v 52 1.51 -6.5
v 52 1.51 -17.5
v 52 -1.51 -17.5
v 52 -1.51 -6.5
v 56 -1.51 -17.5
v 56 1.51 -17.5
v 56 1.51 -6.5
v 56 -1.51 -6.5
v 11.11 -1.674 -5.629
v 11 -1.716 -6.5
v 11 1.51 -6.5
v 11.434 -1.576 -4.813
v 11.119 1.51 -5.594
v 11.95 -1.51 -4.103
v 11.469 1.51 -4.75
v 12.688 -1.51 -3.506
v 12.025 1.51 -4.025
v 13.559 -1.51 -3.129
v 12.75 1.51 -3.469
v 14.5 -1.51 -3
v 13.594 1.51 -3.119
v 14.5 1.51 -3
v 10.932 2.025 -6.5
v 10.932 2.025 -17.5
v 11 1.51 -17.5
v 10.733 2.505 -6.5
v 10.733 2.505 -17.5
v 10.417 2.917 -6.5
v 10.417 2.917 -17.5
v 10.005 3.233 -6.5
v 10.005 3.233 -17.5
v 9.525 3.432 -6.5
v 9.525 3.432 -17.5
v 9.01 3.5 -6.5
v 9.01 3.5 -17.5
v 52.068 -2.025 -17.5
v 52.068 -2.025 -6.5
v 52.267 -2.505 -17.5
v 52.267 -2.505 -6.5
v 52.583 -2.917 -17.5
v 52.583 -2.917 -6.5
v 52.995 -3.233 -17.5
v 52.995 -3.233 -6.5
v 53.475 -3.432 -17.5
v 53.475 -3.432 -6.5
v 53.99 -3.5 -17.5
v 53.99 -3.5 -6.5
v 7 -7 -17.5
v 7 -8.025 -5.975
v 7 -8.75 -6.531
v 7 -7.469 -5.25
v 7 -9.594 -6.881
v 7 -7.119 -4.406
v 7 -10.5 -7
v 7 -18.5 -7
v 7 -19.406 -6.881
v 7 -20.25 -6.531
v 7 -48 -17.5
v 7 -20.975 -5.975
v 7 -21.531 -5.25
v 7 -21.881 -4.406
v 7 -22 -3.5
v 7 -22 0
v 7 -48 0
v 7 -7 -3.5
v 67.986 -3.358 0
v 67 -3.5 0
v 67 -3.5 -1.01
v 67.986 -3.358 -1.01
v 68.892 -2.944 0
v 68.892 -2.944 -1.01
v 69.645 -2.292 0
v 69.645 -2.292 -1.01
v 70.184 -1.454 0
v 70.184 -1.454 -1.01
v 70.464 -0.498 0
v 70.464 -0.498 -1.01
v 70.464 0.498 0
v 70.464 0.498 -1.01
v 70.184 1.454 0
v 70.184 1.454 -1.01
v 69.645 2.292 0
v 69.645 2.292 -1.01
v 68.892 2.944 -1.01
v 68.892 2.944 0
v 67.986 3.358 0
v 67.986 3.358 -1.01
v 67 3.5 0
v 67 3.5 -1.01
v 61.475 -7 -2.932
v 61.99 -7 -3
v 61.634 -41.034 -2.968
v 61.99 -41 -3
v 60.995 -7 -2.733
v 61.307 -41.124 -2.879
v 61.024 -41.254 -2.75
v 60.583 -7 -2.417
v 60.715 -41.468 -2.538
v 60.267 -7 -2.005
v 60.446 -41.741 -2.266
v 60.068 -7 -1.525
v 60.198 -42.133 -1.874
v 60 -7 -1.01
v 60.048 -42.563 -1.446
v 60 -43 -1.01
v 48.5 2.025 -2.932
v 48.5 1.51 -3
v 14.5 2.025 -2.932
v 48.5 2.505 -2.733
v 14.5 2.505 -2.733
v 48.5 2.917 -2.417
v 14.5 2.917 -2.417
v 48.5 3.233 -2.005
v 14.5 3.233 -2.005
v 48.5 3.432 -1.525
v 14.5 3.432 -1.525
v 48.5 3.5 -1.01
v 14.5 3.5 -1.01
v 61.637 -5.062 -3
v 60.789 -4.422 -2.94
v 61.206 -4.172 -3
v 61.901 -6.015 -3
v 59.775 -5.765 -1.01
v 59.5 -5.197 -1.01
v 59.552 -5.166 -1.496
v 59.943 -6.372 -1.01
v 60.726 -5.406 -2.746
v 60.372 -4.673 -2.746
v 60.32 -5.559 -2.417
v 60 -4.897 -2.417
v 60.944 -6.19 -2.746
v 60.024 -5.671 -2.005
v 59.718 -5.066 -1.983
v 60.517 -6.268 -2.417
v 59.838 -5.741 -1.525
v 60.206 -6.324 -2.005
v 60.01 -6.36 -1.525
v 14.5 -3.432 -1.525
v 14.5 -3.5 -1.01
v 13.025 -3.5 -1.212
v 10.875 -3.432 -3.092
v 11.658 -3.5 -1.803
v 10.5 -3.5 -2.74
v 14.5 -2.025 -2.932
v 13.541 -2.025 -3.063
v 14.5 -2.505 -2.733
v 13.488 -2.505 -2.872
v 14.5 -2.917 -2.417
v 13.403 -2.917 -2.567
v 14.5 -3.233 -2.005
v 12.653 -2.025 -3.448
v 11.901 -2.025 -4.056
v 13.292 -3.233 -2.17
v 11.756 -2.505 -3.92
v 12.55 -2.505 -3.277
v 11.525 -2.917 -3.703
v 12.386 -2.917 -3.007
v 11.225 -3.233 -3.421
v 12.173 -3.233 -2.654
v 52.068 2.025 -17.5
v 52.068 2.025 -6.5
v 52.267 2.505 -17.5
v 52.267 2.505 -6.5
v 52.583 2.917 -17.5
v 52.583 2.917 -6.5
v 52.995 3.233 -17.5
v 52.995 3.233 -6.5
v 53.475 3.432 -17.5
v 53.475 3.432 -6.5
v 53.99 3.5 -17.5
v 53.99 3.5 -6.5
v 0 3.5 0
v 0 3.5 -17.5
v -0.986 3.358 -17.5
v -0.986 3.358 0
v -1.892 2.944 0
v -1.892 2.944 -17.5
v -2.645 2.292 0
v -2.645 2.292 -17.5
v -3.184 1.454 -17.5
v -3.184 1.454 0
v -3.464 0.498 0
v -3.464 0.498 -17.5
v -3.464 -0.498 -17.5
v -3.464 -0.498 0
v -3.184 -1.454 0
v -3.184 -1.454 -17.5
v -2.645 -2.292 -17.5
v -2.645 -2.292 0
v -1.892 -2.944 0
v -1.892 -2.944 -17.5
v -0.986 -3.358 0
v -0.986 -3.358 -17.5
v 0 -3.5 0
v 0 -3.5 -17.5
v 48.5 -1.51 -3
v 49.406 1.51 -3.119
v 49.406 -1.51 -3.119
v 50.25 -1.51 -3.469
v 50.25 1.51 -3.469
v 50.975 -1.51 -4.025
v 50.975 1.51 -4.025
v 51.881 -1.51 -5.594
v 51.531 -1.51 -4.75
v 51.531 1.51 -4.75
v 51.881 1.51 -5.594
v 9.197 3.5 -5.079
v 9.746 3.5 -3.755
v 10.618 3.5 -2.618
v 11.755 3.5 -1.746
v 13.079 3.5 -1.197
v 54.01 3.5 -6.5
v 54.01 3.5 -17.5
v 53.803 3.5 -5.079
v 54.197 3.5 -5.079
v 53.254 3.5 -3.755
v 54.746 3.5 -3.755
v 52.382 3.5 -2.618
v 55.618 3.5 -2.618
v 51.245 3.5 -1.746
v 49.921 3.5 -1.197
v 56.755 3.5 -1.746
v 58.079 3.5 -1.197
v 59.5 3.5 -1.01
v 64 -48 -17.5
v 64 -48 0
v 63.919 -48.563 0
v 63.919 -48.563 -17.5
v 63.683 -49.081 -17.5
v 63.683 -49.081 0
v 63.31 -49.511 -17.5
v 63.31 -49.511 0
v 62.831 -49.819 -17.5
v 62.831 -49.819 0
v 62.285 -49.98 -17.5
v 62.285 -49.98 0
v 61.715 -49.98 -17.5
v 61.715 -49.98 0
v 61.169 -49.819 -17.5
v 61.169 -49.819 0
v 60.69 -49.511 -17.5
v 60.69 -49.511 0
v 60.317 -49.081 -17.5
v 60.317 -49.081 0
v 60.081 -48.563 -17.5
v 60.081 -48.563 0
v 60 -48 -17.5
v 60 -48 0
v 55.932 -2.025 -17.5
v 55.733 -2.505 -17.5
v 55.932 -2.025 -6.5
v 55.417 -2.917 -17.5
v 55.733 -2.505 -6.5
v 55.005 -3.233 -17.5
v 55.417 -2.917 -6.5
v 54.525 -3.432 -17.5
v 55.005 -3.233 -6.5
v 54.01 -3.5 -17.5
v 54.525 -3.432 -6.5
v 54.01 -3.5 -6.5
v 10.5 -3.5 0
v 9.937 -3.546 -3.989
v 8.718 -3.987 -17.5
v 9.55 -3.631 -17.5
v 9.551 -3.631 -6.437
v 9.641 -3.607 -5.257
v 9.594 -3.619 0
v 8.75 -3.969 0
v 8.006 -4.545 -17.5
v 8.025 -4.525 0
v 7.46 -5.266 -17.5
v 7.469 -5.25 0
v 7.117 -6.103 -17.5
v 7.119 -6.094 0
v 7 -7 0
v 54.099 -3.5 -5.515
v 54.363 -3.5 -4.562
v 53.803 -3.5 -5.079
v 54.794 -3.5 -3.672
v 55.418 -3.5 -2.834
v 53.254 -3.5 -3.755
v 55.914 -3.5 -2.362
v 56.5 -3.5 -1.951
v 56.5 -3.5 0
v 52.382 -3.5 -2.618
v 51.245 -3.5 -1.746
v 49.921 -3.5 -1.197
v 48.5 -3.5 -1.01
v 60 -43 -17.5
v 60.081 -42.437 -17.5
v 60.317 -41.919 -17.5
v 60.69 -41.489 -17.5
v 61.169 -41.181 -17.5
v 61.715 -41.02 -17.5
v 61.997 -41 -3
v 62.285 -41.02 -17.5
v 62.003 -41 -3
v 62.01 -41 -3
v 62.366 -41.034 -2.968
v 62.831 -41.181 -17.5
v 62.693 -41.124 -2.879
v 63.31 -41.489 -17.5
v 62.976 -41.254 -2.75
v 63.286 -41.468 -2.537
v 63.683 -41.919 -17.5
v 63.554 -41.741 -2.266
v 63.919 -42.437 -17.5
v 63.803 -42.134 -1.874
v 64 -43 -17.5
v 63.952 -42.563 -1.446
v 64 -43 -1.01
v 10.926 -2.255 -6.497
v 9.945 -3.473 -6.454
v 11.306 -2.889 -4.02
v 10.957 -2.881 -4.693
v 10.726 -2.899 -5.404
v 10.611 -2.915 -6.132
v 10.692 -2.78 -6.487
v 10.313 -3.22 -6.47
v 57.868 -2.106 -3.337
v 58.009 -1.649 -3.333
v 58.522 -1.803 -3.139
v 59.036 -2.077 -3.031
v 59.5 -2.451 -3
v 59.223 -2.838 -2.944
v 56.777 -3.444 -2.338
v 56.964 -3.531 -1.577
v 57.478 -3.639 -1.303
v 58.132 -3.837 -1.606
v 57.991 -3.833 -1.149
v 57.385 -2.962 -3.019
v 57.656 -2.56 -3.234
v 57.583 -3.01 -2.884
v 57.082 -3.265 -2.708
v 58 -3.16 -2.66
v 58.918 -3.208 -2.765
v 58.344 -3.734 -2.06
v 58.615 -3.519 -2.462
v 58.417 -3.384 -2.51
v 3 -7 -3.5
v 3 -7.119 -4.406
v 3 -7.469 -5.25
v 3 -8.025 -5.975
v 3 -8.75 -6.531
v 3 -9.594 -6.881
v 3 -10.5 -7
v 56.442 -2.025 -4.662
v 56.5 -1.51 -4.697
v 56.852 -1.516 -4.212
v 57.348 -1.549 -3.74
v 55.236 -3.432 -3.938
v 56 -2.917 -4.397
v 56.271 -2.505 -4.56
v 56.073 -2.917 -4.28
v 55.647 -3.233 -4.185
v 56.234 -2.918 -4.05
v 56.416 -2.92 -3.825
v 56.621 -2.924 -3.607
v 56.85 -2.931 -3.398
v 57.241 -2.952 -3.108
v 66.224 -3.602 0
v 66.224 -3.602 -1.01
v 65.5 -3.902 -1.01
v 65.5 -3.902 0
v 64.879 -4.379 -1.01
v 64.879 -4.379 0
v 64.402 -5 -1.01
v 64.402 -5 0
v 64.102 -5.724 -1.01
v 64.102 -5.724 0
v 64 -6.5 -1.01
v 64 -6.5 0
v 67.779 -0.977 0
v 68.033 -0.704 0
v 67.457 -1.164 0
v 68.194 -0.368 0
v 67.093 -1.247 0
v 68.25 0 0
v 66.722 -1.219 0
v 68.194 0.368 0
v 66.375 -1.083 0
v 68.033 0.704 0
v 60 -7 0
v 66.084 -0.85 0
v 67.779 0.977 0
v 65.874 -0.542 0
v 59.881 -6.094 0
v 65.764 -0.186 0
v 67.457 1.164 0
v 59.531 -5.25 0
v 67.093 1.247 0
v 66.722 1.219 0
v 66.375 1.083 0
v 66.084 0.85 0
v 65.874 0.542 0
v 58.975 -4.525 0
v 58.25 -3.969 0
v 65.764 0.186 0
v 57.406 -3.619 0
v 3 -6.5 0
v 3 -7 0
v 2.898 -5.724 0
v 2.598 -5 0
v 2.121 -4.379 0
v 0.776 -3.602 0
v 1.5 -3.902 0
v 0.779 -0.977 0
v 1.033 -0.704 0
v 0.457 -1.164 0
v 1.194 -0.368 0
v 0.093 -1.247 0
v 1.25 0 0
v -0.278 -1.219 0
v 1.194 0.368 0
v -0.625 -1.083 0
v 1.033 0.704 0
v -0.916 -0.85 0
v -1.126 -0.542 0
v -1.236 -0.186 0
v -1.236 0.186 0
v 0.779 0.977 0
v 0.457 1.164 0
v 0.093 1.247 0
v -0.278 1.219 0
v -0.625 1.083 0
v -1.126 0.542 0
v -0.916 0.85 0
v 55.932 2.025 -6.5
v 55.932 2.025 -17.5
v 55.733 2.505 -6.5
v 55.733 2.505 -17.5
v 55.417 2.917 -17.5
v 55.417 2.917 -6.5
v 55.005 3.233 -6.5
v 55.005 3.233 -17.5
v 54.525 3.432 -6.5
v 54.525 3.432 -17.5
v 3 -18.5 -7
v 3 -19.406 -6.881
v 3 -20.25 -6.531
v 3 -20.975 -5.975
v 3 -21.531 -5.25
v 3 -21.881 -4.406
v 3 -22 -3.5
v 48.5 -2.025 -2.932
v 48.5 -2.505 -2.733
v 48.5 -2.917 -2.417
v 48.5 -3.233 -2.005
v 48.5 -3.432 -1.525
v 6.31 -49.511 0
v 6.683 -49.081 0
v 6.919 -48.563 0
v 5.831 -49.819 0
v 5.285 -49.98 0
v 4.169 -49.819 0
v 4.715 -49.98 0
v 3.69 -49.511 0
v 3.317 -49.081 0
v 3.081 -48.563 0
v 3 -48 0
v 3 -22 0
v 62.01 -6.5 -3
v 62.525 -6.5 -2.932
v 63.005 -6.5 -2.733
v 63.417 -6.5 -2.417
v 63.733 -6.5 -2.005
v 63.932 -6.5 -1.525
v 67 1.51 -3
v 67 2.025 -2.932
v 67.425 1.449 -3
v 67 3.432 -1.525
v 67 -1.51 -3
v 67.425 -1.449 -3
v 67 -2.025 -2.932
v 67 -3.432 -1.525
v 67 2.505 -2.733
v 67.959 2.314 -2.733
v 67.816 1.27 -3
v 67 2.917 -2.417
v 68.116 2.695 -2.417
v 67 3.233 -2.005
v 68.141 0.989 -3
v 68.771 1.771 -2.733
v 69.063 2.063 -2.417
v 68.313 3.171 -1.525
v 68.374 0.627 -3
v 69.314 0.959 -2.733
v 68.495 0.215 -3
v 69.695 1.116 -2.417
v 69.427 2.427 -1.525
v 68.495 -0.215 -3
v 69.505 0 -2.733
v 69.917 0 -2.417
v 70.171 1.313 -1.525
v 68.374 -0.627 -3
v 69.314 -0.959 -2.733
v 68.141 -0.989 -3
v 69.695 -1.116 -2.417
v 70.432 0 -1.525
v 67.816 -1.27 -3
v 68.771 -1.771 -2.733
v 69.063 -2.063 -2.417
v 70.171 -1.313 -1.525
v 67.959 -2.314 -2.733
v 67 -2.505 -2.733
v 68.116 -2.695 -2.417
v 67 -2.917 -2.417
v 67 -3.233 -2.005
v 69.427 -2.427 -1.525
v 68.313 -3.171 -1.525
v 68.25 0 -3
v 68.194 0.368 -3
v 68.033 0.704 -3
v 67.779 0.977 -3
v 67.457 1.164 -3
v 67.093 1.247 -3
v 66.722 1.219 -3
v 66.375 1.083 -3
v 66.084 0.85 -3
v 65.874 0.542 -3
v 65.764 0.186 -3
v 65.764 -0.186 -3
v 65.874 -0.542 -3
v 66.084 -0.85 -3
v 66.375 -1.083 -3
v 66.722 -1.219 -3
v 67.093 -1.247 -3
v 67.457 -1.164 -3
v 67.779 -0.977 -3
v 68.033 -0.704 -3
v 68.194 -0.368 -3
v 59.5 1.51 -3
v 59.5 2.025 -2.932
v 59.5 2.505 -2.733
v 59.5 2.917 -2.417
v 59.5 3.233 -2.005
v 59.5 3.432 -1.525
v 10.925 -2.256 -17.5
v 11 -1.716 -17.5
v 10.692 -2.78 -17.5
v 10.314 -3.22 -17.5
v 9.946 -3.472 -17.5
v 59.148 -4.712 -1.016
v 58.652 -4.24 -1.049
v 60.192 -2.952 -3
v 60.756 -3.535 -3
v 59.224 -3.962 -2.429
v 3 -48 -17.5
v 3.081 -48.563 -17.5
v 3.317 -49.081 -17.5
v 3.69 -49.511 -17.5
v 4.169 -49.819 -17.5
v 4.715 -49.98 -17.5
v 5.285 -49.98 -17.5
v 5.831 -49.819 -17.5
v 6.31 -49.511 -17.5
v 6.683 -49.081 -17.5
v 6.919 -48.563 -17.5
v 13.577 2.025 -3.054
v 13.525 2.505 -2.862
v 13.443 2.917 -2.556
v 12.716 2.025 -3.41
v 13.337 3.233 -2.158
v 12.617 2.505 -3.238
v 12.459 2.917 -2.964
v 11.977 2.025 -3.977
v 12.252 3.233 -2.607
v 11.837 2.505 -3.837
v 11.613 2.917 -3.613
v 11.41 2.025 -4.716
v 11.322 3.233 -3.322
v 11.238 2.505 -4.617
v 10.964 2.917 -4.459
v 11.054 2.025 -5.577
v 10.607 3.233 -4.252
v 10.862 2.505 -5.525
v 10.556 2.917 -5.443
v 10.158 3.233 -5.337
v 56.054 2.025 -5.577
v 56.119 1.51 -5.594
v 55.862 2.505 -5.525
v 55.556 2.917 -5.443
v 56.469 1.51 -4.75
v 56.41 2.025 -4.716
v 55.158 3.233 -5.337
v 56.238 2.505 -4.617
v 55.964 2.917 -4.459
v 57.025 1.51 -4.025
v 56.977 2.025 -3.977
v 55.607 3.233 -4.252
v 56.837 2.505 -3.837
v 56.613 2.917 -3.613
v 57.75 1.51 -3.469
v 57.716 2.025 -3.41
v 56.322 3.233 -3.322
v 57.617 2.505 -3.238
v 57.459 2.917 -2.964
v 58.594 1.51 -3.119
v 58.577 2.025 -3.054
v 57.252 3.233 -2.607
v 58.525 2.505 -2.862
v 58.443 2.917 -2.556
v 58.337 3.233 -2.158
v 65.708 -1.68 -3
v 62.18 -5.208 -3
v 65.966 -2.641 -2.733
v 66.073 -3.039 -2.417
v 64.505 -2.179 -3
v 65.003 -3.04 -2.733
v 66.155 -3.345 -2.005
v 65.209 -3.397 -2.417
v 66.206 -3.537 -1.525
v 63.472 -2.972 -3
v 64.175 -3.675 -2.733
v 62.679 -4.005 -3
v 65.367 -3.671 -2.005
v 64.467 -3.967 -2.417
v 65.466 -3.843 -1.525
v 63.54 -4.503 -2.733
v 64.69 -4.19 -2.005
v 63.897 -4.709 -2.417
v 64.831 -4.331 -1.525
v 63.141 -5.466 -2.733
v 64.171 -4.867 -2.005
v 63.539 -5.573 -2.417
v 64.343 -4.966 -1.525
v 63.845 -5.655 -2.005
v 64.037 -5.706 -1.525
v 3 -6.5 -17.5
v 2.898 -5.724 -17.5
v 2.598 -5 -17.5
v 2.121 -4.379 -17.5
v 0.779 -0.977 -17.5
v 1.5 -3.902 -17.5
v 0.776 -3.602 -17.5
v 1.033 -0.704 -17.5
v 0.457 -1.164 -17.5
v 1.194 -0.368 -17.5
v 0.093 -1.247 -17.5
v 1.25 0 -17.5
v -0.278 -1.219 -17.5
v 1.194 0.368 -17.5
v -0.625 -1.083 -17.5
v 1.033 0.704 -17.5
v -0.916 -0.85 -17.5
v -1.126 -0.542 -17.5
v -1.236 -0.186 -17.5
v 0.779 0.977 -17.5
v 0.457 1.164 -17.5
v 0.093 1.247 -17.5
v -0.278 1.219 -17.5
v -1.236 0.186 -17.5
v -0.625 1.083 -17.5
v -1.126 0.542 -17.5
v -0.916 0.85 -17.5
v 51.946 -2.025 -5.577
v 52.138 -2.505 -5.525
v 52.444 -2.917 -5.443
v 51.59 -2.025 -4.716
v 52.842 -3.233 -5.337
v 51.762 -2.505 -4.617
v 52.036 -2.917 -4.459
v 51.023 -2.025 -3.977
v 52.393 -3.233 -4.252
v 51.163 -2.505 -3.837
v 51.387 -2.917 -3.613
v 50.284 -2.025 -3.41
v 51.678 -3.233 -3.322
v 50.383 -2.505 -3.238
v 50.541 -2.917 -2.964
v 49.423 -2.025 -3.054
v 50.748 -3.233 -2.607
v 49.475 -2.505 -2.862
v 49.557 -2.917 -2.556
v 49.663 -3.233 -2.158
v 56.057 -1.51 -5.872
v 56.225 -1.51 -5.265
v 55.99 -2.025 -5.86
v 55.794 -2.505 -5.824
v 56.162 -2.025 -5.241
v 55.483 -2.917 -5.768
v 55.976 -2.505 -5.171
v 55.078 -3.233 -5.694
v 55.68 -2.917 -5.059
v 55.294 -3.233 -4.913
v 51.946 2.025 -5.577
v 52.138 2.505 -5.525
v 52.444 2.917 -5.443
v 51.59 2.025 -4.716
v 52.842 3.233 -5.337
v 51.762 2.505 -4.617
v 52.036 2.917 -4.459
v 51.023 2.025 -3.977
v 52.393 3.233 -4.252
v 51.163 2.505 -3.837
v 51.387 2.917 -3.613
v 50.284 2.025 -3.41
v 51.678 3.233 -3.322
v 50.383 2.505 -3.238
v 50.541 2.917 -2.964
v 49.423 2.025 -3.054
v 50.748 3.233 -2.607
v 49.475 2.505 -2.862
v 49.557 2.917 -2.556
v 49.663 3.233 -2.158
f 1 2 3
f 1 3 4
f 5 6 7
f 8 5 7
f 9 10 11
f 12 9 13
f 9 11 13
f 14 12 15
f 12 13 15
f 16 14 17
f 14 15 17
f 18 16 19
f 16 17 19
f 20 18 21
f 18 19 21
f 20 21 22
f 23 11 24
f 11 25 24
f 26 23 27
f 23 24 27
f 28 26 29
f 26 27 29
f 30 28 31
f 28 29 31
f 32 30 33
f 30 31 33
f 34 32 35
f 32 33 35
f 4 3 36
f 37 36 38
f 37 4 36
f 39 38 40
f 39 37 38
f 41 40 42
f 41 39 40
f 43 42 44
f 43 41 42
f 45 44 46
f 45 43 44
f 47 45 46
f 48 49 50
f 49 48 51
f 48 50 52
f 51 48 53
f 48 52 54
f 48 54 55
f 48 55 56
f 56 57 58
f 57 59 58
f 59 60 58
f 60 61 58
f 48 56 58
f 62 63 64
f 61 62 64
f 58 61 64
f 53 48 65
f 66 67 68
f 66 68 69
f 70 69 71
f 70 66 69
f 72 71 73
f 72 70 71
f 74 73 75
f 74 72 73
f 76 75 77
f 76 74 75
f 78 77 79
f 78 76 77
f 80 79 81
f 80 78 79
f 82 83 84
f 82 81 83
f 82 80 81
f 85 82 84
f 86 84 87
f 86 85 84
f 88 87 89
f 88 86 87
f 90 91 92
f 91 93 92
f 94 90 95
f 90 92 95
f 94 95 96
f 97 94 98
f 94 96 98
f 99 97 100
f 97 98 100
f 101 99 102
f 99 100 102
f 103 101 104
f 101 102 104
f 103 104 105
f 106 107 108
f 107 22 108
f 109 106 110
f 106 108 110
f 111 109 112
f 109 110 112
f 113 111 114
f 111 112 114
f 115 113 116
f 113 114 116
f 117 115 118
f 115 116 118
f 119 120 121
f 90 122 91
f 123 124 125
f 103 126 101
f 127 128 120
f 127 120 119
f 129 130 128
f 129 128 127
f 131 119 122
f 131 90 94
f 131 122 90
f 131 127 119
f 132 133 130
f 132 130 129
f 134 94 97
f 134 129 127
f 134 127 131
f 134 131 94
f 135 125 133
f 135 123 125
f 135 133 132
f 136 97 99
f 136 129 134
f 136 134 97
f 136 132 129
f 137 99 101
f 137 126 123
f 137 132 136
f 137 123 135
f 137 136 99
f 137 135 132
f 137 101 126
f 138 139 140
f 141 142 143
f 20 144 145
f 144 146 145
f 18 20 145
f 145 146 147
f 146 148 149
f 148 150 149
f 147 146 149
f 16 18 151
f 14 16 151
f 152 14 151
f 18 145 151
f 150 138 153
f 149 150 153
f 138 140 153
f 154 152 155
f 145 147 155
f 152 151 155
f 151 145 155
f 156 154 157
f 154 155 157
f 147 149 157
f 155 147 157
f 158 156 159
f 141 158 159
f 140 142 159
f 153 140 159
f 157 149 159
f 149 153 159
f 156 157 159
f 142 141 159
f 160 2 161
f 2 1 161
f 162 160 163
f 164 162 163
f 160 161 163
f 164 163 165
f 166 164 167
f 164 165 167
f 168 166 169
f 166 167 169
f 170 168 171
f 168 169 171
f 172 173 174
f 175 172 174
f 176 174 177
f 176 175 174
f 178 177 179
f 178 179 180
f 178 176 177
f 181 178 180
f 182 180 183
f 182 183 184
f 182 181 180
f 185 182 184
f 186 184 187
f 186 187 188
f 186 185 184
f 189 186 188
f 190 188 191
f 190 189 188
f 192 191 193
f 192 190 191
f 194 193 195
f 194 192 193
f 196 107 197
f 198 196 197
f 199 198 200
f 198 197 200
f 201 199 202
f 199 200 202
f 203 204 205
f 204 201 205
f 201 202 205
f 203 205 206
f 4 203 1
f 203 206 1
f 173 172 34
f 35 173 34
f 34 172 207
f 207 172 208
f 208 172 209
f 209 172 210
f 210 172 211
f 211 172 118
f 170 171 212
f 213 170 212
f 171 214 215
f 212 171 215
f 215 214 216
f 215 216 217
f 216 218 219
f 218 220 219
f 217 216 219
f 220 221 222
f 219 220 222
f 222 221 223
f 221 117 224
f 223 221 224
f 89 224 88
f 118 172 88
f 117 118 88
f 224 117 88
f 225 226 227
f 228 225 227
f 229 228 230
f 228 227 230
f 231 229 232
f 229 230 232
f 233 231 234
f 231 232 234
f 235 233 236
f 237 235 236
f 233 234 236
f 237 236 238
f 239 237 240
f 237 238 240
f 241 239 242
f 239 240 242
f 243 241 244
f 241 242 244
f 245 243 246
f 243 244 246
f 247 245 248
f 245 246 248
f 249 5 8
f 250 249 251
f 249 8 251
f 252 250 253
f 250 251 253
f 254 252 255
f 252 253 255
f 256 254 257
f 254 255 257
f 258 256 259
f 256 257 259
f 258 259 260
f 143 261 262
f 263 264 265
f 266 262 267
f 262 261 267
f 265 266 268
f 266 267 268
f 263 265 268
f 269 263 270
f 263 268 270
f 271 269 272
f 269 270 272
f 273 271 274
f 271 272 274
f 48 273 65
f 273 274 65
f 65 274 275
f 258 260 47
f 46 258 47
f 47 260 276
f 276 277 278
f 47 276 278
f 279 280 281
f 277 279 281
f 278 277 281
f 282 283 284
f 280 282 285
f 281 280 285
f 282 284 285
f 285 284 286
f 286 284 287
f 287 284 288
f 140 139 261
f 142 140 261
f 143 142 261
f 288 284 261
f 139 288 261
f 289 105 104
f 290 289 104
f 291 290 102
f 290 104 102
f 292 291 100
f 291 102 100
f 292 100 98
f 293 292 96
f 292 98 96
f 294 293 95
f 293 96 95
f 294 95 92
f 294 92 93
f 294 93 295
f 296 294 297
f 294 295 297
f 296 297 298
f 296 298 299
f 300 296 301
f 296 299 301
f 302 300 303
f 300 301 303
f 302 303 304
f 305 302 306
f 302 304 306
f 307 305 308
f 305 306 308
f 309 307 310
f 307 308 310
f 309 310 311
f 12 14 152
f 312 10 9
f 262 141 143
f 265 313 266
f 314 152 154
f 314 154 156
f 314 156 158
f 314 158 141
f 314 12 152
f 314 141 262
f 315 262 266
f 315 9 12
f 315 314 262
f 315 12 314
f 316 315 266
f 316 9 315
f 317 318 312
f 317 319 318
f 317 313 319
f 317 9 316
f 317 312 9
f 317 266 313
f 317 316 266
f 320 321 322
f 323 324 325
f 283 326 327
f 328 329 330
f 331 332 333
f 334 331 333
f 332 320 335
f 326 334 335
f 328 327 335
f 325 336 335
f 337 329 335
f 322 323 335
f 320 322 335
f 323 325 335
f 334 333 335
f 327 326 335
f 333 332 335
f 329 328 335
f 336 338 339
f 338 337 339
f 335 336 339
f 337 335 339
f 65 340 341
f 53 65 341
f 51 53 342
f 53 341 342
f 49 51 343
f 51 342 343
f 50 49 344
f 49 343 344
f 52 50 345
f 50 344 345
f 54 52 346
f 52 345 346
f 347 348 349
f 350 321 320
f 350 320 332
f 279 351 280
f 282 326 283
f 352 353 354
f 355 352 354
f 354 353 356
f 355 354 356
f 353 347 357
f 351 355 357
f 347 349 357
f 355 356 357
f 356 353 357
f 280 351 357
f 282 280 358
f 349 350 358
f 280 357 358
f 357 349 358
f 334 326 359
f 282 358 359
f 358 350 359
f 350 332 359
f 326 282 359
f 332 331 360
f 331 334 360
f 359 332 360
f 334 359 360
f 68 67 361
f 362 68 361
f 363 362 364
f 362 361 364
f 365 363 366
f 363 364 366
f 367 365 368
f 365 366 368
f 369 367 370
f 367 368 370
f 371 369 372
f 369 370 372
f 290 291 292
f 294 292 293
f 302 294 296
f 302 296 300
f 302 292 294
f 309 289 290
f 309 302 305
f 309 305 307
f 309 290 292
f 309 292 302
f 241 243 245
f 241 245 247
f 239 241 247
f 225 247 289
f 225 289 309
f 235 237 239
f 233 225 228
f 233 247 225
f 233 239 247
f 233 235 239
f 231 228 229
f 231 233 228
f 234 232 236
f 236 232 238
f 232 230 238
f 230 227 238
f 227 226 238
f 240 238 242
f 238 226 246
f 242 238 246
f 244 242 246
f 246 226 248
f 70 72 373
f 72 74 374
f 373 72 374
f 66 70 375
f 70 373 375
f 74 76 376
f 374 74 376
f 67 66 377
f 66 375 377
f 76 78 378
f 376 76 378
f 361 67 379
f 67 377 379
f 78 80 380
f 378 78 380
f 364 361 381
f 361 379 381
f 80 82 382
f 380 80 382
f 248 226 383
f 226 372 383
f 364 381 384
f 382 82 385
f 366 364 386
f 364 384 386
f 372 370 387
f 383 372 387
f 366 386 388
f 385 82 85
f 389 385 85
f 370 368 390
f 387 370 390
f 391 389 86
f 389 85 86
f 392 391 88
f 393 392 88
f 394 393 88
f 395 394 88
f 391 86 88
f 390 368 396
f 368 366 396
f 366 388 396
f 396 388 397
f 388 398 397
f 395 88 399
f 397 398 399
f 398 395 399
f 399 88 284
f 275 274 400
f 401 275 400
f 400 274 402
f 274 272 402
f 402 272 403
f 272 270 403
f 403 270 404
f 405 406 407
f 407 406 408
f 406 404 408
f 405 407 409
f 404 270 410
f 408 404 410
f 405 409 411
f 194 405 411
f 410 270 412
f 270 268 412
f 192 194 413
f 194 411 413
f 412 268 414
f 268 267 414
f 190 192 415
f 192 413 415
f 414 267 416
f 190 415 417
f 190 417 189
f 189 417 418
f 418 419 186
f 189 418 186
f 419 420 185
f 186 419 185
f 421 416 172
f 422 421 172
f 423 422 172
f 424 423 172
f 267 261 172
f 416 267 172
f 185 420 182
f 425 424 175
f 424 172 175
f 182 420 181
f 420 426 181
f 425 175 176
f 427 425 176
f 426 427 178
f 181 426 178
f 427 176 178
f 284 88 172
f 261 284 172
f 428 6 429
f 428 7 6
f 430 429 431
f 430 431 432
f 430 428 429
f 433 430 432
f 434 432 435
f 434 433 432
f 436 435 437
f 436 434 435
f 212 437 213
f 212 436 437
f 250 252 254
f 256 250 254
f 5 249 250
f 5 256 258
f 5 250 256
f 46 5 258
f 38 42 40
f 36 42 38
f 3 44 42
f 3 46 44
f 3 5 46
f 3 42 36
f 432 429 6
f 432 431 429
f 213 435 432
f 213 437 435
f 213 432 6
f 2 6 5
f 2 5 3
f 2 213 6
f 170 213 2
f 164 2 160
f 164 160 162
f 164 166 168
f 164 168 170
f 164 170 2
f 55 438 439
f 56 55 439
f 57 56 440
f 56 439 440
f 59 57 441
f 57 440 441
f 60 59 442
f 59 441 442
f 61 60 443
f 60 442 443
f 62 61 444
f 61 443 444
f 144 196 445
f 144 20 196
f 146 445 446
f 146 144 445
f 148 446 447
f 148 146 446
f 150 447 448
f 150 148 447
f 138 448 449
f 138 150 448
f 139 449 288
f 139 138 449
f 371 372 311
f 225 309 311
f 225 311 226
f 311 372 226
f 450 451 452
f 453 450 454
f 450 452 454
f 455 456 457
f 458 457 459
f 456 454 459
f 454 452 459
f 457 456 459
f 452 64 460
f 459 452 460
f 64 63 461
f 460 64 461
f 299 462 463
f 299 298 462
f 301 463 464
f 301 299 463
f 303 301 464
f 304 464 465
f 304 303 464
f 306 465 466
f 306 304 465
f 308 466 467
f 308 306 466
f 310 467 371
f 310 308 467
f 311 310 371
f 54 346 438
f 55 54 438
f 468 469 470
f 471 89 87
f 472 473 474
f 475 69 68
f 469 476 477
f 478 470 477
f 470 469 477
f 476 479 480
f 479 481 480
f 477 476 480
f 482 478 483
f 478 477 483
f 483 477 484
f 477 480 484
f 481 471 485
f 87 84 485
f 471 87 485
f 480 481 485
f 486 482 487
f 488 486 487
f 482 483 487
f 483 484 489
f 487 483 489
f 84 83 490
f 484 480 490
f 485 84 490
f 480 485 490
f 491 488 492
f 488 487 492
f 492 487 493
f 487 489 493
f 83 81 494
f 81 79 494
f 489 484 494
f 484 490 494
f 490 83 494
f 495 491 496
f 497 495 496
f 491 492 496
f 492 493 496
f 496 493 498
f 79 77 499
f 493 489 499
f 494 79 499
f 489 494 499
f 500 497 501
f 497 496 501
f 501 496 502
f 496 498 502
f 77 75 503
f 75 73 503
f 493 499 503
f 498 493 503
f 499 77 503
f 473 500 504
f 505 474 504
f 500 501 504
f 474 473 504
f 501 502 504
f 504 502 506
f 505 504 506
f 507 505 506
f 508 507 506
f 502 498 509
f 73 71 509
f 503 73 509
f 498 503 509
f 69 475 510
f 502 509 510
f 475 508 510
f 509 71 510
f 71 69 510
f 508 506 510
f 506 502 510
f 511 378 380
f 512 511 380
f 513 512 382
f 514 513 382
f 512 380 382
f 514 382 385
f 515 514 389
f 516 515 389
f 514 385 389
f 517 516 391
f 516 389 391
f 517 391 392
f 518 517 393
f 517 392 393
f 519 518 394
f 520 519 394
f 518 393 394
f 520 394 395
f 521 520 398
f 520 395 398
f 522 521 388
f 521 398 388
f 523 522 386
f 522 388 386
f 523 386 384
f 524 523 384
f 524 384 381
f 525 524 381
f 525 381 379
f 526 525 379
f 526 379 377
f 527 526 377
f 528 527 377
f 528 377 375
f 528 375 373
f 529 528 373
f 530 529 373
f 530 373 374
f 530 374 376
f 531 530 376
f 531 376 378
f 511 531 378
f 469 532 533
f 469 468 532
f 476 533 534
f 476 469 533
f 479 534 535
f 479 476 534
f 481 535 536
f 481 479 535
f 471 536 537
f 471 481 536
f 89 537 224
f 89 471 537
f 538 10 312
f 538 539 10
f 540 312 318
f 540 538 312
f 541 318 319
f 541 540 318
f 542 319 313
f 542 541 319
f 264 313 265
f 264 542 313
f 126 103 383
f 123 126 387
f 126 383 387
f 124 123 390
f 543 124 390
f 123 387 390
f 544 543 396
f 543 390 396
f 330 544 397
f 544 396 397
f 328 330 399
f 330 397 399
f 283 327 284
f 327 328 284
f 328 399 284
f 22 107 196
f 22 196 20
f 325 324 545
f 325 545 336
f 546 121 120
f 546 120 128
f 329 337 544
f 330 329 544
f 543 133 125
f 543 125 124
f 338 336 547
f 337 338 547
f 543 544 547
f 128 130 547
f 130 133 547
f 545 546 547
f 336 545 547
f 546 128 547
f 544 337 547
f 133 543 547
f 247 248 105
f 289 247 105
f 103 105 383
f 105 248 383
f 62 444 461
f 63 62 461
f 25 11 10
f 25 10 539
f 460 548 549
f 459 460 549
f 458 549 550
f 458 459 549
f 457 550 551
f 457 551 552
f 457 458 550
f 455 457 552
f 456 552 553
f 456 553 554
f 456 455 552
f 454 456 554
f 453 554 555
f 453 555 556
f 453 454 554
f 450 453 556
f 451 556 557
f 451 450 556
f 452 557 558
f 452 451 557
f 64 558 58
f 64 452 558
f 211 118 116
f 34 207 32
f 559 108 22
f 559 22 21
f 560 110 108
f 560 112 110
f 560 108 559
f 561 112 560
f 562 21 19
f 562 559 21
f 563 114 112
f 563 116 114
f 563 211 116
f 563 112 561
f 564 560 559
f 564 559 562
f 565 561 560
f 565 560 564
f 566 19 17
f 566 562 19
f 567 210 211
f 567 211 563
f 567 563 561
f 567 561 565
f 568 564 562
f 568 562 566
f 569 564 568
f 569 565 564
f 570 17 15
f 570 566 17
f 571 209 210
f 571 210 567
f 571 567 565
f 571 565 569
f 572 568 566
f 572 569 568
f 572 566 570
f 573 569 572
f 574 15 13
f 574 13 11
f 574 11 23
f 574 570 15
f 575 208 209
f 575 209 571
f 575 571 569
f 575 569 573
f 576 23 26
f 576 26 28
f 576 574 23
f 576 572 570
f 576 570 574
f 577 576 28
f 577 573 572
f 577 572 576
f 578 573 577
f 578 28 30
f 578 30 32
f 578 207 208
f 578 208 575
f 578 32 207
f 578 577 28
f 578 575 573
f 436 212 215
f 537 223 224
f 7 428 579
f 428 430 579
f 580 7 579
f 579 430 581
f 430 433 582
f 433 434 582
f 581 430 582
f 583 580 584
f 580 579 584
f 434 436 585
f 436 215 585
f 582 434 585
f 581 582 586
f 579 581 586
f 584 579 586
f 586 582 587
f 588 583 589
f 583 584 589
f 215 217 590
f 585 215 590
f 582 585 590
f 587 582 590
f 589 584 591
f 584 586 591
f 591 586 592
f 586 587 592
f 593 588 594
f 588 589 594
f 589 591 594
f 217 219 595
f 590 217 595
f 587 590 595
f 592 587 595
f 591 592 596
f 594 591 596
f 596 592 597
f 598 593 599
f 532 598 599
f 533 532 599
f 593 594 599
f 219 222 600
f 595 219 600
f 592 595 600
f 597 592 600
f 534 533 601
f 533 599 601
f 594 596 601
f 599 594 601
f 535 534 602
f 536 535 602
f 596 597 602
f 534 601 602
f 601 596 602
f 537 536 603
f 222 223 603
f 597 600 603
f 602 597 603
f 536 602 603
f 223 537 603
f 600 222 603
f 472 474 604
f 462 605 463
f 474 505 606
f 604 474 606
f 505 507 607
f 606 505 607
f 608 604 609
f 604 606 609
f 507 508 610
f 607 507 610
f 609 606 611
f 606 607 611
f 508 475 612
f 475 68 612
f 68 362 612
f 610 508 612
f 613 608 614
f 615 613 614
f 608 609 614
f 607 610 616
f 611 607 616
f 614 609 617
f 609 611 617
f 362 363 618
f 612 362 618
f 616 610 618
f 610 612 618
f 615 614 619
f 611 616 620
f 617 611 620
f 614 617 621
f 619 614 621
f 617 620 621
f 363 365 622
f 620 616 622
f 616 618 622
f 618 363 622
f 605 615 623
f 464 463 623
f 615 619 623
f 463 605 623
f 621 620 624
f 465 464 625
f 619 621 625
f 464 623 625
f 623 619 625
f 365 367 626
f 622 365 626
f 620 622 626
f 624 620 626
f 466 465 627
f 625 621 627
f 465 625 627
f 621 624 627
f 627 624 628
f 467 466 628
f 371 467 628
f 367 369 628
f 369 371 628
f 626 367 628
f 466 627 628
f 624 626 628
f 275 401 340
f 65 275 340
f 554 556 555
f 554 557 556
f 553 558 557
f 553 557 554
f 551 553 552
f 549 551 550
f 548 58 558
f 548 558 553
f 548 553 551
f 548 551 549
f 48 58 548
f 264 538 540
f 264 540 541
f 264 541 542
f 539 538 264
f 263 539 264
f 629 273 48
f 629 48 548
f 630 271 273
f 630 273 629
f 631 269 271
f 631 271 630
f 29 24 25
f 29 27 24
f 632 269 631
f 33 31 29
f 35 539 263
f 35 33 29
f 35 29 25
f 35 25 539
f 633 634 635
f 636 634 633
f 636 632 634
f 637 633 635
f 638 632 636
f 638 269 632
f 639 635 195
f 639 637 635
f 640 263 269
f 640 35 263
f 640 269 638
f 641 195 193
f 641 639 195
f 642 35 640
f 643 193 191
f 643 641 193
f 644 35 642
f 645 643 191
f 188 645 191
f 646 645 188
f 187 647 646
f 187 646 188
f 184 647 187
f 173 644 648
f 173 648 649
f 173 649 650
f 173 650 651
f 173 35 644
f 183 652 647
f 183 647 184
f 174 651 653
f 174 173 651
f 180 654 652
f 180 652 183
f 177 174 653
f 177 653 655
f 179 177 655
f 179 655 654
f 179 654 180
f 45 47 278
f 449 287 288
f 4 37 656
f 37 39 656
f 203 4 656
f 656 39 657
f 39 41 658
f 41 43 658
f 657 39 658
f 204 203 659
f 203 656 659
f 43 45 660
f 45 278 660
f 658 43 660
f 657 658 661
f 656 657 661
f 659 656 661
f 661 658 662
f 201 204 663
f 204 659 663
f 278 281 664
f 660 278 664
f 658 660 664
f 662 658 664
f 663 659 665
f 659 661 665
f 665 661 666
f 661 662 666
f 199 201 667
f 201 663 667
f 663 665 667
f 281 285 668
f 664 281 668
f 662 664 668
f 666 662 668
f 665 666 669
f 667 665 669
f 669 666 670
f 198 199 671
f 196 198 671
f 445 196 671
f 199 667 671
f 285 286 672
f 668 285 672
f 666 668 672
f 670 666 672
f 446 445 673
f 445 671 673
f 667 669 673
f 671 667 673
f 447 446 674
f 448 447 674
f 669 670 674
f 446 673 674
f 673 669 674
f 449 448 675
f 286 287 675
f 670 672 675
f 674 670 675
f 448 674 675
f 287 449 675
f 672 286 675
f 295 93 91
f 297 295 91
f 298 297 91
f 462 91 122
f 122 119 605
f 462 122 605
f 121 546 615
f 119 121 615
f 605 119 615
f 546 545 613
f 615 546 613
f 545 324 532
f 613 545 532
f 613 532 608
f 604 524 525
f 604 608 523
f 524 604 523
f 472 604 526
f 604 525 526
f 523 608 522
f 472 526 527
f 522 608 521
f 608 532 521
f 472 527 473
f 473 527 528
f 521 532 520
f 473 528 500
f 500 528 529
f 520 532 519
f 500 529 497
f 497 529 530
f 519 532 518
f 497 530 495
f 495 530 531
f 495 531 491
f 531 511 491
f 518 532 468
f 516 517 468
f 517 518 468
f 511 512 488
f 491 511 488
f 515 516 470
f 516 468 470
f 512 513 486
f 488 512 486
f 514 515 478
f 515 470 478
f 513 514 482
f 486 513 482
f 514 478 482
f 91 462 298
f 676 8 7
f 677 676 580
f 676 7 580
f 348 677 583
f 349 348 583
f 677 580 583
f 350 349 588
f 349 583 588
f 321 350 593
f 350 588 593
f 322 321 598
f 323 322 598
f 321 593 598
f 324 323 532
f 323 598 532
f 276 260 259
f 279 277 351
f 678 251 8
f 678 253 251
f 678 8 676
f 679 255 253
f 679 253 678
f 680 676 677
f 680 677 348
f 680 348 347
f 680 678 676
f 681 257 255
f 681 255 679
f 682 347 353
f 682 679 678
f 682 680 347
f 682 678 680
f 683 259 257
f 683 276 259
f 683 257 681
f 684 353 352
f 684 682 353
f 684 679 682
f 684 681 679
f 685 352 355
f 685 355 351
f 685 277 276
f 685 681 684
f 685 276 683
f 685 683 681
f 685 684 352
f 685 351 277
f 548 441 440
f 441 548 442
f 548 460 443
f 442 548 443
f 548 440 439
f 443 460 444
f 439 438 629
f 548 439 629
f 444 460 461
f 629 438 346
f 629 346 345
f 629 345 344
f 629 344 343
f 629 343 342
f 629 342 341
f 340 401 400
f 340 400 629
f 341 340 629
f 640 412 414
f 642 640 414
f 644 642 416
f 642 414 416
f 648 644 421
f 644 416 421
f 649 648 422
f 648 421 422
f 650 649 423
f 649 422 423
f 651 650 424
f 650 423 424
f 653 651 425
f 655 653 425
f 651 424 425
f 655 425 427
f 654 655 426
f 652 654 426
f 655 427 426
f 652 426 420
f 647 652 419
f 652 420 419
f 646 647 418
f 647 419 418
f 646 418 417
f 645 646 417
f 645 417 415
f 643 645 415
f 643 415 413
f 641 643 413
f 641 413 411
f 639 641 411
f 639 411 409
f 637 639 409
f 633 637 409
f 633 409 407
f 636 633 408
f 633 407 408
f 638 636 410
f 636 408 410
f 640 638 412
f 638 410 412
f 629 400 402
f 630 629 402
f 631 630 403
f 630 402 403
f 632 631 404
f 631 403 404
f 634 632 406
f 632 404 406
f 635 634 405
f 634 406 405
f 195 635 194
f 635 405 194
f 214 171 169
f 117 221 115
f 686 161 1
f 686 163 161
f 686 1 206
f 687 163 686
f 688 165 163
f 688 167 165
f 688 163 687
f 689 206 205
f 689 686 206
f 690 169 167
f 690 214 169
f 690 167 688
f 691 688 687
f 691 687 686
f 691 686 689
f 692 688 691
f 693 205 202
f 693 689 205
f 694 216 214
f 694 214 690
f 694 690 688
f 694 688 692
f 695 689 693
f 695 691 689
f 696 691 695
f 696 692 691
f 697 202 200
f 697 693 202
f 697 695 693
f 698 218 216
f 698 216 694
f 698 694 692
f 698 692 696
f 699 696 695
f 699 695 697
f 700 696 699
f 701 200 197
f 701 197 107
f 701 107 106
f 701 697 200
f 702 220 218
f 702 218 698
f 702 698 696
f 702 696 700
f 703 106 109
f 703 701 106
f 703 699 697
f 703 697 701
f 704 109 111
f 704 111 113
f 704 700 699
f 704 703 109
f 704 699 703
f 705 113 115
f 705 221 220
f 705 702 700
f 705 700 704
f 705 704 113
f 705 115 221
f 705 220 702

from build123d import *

# Parameters (mm, degrees)
SKETCH_R          = 1.25
PAD_DEPTH         = 17.5
POCKET_DEPTH      = 53.501
POCKET_DEPTH_BACK = 0.001
POCKET001_DEPTH   = 5
PAD001_DEPTH      = 14.5
FILLET_R          = 1.99


with BuildPart() as part:
    # Sketch → Pad (new body)
    with BuildSketch(Plane.XY):
        with BuildLine():
            Line((0, 3.5), (67, 3.5))
            ThreePointArc((67, -3.5), (70.5, 0), (67, 3.5))
            ThreePointArc((67, -3.5), (64.87868, -4.37868), (64, -6.5))
            Line((64, -48), (64, -6.5))
            ThreePointArc((60, -48), (62, -50), (64, -48))
            Line((60, -48), (60, -7))
            ThreePointArc((60, -7), (58.974874, -4.525126), (56.5, -3.5))
            Line((56.5, -3.5), (10.5, -3.5))
            ThreePointArc((10.5, -3.5), (8.025126, -4.525126), (7, -7))
            Line((7, -7), (7, -48))
            ThreePointArc((3, -48), (5, -50), (7, -48))
            Line((3, -48), (3, -6.5))
            ThreePointArc((3, -6.5), (2.12132, -4.37868), (0, -3.5))
            ThreePointArc((0, 3.5), (-3.5, 0), (0, -3.5))
        make_face()
        Circle(SKETCH_R, mode=Mode.SUBTRACT)
        with Locations((67, 0)):
            Circle(SKETCH_R, mode=Mode.SUBTRACT)
    extrude(amount=-PAD_DEPTH)

    # Sketch001 (on Face4 of Pad) → Pocket (cut, two sides)
    with BuildSketch(Plane(origin=(0, 3.5, 0), x_dir=(-1, 0, 0), z_dir=(0, 1, 0))) as pocket_sk:
        with BuildLine():
            Line((-11, -17.5), (-52, -17.5))
            Line((-52, -17.5), (-52, -6.5))
            ThreePointArc((-48.5, -3), (-50.974874, -4.025126), (-52, -6.5))
            Line((-48.5, -3), (-14.5, -3))
            ThreePointArc((-11, -6.5), (-12.025126, -4.025126), (-14.5, -3))
            Line((-11, -6.5), (-11, -17.5))
        make_face()
        with BuildLine():
            Line((-56, -17.5), (-56, -6.5))
            ThreePointArc((-56, -6.5), (-57.025126, -4.025126), (-59.5, -3))
            Line((-59.5, -3), (-70.5, -3))
            Line((-70.5, -3), (-70.5, -17.5))
            Line((-70.5, -17.5), (-56, -17.5))
        make_face()
    extrude(amount=-POCKET_DEPTH, mode=Mode.SUBTRACT)
    extrude(pocket_sk.sketch, amount=POCKET_DEPTH_BACK, mode=Mode.SUBTRACT)

    # Sketch002 (on Face1 of Pocket) → Pocket001 (cut)
    with BuildSketch(Plane(origin=(3, 0, 0), x_dir=(0, -1, 0), z_dir=(-1, 0, 0))):
        with BuildLine():
            Line((7, 0), (7, -3.5))
            ThreePointArc((7, -3.5), (8.025126, -5.974874), (10.5, -7))
            Line((10.5, -7), (18.5, -7))
            ThreePointArc((18.5, -7), (20.974874, -5.974874), (22, -3.5))
            Line((22, -3.5), (22, 0))
            Line((22, 0), (7, 0))
        make_face()
    extrude(amount=-POCKET001_DEPTH, mode=Mode.SUBTRACT)

    # Sketch003 (on Face26 of Pocket001) → Pad001 (join)
    with BuildSketch(Plane(origin=(0, 0, -3), x_dir=(1, 0, 0), z_dir=(0, 0, -1))):
        with BuildLine():
            ThreePointArc((64, 48), (62, 50), (60, 48))
            Line((60, 48), (60, 43))
            ThreePointArc((60, 43), (62, 41), (64, 43))
            Line((64, 43), (64, 48))
        make_face()
    extrude(amount=PAD001_DEPTH)

    # Fillet
    fillet_edges = [part.edges().sort_by_distance(p)[0] for p in [
        (11, -3.5, -12),
        (11, 3.5, -12),
        (56, 3.5, -12),
        (52, 3.5, -12),
        (56, -3.5, -12),
        (52, -3.5, -12),
    ]]
    fillet(fillet_edges, radius=FILLET_R)


solid = part.part
